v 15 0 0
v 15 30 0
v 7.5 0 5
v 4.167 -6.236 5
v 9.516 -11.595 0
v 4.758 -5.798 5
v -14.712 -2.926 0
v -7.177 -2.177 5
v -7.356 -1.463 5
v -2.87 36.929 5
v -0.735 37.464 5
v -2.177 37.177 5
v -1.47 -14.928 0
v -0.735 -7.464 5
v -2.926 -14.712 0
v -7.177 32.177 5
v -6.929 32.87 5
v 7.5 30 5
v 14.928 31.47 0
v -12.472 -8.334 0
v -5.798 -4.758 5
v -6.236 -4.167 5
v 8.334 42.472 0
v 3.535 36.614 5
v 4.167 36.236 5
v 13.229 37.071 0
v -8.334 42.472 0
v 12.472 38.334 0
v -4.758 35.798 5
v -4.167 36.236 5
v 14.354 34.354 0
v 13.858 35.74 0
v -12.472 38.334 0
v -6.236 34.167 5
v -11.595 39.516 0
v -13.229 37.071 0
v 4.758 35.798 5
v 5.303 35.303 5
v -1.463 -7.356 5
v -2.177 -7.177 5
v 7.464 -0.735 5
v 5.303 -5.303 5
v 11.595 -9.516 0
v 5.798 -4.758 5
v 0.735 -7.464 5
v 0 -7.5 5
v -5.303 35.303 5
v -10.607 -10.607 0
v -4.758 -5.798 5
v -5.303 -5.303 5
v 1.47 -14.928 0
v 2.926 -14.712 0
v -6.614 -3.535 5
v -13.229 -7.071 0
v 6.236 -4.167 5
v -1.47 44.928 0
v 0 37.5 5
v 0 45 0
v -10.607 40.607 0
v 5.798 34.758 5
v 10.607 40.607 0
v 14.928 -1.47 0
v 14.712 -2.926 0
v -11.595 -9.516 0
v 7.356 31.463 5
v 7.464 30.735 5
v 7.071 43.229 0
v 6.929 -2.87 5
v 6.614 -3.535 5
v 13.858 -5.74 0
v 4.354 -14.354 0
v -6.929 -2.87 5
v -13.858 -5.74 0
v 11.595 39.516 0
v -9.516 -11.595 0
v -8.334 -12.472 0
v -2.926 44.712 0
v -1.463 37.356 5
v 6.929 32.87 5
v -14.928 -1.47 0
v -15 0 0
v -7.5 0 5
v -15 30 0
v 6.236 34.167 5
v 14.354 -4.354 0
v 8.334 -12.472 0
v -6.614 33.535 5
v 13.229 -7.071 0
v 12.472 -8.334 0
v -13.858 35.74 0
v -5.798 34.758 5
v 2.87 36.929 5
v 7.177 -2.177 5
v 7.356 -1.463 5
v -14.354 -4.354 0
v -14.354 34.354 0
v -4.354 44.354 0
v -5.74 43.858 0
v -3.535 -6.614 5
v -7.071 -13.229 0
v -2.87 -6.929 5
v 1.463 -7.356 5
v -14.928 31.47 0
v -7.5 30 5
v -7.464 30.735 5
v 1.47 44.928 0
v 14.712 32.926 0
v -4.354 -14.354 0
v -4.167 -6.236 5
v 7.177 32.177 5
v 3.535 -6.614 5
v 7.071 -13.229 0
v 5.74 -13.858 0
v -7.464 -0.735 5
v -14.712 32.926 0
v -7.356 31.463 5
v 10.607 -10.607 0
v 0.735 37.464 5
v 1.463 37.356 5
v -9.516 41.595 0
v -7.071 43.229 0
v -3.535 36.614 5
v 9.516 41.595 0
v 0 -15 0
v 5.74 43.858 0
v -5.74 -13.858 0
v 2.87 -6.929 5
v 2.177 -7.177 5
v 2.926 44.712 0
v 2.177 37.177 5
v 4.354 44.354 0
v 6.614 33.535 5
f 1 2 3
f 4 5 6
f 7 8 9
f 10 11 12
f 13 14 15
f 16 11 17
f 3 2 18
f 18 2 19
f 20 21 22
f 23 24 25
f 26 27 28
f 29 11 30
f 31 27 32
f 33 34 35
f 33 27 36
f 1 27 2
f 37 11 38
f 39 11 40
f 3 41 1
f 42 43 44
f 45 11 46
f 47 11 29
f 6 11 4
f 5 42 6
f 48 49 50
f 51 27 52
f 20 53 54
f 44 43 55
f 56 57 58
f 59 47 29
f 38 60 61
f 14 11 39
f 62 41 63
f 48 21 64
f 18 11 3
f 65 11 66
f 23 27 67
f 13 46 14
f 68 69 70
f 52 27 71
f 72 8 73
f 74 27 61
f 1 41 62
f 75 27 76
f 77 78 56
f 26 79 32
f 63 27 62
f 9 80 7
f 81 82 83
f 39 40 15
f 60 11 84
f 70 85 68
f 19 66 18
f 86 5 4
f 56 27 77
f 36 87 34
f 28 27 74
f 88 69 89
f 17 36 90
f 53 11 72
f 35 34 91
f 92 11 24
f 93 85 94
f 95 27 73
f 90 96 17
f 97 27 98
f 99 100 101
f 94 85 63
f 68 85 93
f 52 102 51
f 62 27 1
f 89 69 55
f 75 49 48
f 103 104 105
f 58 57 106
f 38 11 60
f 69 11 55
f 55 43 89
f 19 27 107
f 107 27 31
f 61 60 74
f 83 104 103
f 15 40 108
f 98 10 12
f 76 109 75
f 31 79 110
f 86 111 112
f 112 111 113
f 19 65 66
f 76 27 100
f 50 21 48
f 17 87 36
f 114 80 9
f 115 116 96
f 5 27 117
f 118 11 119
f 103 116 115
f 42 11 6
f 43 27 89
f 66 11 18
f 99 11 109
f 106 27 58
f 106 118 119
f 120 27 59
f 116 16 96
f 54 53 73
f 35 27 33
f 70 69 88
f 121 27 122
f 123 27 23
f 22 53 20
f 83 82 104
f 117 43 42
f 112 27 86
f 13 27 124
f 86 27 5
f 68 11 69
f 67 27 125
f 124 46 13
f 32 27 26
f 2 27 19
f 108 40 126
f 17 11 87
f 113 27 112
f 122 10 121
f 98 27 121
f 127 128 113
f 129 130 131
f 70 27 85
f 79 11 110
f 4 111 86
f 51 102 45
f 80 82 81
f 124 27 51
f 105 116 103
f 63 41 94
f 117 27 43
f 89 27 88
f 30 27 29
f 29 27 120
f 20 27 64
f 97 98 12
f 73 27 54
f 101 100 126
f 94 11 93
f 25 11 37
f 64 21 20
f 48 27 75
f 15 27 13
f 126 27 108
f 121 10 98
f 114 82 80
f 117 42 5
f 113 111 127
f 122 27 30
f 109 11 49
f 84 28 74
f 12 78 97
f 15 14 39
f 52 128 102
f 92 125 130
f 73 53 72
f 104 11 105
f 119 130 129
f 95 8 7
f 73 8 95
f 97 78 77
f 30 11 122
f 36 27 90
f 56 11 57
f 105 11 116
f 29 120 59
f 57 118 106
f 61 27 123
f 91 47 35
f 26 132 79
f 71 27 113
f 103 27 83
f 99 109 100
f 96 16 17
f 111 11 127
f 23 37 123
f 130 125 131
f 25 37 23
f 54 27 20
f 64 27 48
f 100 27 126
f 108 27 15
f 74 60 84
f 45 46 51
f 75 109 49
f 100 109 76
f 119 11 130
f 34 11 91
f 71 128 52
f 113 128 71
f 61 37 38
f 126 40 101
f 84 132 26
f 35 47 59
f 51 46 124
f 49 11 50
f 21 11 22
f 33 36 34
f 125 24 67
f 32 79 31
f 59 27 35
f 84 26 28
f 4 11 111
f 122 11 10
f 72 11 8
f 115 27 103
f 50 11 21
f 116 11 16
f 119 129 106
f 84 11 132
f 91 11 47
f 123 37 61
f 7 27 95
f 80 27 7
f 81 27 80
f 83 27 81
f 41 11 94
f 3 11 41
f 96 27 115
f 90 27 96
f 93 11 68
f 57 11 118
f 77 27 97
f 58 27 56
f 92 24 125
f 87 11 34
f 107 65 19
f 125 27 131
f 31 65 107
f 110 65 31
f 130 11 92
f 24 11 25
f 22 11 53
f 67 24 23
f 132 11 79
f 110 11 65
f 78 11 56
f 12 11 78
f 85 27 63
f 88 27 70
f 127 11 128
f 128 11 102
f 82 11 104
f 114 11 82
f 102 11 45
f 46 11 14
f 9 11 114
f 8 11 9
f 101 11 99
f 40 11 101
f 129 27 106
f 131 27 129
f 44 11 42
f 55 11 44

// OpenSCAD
module SlotExample3(){
  color("pink")hull(){
      cylinder(d1=30,d2=15,h=5,$fn=64);
      translate([0, 30, 0])cylinder(d1=30,d2=15,h=5,$fn=64);
    }
}
$fn=64;
SlotExample3();
